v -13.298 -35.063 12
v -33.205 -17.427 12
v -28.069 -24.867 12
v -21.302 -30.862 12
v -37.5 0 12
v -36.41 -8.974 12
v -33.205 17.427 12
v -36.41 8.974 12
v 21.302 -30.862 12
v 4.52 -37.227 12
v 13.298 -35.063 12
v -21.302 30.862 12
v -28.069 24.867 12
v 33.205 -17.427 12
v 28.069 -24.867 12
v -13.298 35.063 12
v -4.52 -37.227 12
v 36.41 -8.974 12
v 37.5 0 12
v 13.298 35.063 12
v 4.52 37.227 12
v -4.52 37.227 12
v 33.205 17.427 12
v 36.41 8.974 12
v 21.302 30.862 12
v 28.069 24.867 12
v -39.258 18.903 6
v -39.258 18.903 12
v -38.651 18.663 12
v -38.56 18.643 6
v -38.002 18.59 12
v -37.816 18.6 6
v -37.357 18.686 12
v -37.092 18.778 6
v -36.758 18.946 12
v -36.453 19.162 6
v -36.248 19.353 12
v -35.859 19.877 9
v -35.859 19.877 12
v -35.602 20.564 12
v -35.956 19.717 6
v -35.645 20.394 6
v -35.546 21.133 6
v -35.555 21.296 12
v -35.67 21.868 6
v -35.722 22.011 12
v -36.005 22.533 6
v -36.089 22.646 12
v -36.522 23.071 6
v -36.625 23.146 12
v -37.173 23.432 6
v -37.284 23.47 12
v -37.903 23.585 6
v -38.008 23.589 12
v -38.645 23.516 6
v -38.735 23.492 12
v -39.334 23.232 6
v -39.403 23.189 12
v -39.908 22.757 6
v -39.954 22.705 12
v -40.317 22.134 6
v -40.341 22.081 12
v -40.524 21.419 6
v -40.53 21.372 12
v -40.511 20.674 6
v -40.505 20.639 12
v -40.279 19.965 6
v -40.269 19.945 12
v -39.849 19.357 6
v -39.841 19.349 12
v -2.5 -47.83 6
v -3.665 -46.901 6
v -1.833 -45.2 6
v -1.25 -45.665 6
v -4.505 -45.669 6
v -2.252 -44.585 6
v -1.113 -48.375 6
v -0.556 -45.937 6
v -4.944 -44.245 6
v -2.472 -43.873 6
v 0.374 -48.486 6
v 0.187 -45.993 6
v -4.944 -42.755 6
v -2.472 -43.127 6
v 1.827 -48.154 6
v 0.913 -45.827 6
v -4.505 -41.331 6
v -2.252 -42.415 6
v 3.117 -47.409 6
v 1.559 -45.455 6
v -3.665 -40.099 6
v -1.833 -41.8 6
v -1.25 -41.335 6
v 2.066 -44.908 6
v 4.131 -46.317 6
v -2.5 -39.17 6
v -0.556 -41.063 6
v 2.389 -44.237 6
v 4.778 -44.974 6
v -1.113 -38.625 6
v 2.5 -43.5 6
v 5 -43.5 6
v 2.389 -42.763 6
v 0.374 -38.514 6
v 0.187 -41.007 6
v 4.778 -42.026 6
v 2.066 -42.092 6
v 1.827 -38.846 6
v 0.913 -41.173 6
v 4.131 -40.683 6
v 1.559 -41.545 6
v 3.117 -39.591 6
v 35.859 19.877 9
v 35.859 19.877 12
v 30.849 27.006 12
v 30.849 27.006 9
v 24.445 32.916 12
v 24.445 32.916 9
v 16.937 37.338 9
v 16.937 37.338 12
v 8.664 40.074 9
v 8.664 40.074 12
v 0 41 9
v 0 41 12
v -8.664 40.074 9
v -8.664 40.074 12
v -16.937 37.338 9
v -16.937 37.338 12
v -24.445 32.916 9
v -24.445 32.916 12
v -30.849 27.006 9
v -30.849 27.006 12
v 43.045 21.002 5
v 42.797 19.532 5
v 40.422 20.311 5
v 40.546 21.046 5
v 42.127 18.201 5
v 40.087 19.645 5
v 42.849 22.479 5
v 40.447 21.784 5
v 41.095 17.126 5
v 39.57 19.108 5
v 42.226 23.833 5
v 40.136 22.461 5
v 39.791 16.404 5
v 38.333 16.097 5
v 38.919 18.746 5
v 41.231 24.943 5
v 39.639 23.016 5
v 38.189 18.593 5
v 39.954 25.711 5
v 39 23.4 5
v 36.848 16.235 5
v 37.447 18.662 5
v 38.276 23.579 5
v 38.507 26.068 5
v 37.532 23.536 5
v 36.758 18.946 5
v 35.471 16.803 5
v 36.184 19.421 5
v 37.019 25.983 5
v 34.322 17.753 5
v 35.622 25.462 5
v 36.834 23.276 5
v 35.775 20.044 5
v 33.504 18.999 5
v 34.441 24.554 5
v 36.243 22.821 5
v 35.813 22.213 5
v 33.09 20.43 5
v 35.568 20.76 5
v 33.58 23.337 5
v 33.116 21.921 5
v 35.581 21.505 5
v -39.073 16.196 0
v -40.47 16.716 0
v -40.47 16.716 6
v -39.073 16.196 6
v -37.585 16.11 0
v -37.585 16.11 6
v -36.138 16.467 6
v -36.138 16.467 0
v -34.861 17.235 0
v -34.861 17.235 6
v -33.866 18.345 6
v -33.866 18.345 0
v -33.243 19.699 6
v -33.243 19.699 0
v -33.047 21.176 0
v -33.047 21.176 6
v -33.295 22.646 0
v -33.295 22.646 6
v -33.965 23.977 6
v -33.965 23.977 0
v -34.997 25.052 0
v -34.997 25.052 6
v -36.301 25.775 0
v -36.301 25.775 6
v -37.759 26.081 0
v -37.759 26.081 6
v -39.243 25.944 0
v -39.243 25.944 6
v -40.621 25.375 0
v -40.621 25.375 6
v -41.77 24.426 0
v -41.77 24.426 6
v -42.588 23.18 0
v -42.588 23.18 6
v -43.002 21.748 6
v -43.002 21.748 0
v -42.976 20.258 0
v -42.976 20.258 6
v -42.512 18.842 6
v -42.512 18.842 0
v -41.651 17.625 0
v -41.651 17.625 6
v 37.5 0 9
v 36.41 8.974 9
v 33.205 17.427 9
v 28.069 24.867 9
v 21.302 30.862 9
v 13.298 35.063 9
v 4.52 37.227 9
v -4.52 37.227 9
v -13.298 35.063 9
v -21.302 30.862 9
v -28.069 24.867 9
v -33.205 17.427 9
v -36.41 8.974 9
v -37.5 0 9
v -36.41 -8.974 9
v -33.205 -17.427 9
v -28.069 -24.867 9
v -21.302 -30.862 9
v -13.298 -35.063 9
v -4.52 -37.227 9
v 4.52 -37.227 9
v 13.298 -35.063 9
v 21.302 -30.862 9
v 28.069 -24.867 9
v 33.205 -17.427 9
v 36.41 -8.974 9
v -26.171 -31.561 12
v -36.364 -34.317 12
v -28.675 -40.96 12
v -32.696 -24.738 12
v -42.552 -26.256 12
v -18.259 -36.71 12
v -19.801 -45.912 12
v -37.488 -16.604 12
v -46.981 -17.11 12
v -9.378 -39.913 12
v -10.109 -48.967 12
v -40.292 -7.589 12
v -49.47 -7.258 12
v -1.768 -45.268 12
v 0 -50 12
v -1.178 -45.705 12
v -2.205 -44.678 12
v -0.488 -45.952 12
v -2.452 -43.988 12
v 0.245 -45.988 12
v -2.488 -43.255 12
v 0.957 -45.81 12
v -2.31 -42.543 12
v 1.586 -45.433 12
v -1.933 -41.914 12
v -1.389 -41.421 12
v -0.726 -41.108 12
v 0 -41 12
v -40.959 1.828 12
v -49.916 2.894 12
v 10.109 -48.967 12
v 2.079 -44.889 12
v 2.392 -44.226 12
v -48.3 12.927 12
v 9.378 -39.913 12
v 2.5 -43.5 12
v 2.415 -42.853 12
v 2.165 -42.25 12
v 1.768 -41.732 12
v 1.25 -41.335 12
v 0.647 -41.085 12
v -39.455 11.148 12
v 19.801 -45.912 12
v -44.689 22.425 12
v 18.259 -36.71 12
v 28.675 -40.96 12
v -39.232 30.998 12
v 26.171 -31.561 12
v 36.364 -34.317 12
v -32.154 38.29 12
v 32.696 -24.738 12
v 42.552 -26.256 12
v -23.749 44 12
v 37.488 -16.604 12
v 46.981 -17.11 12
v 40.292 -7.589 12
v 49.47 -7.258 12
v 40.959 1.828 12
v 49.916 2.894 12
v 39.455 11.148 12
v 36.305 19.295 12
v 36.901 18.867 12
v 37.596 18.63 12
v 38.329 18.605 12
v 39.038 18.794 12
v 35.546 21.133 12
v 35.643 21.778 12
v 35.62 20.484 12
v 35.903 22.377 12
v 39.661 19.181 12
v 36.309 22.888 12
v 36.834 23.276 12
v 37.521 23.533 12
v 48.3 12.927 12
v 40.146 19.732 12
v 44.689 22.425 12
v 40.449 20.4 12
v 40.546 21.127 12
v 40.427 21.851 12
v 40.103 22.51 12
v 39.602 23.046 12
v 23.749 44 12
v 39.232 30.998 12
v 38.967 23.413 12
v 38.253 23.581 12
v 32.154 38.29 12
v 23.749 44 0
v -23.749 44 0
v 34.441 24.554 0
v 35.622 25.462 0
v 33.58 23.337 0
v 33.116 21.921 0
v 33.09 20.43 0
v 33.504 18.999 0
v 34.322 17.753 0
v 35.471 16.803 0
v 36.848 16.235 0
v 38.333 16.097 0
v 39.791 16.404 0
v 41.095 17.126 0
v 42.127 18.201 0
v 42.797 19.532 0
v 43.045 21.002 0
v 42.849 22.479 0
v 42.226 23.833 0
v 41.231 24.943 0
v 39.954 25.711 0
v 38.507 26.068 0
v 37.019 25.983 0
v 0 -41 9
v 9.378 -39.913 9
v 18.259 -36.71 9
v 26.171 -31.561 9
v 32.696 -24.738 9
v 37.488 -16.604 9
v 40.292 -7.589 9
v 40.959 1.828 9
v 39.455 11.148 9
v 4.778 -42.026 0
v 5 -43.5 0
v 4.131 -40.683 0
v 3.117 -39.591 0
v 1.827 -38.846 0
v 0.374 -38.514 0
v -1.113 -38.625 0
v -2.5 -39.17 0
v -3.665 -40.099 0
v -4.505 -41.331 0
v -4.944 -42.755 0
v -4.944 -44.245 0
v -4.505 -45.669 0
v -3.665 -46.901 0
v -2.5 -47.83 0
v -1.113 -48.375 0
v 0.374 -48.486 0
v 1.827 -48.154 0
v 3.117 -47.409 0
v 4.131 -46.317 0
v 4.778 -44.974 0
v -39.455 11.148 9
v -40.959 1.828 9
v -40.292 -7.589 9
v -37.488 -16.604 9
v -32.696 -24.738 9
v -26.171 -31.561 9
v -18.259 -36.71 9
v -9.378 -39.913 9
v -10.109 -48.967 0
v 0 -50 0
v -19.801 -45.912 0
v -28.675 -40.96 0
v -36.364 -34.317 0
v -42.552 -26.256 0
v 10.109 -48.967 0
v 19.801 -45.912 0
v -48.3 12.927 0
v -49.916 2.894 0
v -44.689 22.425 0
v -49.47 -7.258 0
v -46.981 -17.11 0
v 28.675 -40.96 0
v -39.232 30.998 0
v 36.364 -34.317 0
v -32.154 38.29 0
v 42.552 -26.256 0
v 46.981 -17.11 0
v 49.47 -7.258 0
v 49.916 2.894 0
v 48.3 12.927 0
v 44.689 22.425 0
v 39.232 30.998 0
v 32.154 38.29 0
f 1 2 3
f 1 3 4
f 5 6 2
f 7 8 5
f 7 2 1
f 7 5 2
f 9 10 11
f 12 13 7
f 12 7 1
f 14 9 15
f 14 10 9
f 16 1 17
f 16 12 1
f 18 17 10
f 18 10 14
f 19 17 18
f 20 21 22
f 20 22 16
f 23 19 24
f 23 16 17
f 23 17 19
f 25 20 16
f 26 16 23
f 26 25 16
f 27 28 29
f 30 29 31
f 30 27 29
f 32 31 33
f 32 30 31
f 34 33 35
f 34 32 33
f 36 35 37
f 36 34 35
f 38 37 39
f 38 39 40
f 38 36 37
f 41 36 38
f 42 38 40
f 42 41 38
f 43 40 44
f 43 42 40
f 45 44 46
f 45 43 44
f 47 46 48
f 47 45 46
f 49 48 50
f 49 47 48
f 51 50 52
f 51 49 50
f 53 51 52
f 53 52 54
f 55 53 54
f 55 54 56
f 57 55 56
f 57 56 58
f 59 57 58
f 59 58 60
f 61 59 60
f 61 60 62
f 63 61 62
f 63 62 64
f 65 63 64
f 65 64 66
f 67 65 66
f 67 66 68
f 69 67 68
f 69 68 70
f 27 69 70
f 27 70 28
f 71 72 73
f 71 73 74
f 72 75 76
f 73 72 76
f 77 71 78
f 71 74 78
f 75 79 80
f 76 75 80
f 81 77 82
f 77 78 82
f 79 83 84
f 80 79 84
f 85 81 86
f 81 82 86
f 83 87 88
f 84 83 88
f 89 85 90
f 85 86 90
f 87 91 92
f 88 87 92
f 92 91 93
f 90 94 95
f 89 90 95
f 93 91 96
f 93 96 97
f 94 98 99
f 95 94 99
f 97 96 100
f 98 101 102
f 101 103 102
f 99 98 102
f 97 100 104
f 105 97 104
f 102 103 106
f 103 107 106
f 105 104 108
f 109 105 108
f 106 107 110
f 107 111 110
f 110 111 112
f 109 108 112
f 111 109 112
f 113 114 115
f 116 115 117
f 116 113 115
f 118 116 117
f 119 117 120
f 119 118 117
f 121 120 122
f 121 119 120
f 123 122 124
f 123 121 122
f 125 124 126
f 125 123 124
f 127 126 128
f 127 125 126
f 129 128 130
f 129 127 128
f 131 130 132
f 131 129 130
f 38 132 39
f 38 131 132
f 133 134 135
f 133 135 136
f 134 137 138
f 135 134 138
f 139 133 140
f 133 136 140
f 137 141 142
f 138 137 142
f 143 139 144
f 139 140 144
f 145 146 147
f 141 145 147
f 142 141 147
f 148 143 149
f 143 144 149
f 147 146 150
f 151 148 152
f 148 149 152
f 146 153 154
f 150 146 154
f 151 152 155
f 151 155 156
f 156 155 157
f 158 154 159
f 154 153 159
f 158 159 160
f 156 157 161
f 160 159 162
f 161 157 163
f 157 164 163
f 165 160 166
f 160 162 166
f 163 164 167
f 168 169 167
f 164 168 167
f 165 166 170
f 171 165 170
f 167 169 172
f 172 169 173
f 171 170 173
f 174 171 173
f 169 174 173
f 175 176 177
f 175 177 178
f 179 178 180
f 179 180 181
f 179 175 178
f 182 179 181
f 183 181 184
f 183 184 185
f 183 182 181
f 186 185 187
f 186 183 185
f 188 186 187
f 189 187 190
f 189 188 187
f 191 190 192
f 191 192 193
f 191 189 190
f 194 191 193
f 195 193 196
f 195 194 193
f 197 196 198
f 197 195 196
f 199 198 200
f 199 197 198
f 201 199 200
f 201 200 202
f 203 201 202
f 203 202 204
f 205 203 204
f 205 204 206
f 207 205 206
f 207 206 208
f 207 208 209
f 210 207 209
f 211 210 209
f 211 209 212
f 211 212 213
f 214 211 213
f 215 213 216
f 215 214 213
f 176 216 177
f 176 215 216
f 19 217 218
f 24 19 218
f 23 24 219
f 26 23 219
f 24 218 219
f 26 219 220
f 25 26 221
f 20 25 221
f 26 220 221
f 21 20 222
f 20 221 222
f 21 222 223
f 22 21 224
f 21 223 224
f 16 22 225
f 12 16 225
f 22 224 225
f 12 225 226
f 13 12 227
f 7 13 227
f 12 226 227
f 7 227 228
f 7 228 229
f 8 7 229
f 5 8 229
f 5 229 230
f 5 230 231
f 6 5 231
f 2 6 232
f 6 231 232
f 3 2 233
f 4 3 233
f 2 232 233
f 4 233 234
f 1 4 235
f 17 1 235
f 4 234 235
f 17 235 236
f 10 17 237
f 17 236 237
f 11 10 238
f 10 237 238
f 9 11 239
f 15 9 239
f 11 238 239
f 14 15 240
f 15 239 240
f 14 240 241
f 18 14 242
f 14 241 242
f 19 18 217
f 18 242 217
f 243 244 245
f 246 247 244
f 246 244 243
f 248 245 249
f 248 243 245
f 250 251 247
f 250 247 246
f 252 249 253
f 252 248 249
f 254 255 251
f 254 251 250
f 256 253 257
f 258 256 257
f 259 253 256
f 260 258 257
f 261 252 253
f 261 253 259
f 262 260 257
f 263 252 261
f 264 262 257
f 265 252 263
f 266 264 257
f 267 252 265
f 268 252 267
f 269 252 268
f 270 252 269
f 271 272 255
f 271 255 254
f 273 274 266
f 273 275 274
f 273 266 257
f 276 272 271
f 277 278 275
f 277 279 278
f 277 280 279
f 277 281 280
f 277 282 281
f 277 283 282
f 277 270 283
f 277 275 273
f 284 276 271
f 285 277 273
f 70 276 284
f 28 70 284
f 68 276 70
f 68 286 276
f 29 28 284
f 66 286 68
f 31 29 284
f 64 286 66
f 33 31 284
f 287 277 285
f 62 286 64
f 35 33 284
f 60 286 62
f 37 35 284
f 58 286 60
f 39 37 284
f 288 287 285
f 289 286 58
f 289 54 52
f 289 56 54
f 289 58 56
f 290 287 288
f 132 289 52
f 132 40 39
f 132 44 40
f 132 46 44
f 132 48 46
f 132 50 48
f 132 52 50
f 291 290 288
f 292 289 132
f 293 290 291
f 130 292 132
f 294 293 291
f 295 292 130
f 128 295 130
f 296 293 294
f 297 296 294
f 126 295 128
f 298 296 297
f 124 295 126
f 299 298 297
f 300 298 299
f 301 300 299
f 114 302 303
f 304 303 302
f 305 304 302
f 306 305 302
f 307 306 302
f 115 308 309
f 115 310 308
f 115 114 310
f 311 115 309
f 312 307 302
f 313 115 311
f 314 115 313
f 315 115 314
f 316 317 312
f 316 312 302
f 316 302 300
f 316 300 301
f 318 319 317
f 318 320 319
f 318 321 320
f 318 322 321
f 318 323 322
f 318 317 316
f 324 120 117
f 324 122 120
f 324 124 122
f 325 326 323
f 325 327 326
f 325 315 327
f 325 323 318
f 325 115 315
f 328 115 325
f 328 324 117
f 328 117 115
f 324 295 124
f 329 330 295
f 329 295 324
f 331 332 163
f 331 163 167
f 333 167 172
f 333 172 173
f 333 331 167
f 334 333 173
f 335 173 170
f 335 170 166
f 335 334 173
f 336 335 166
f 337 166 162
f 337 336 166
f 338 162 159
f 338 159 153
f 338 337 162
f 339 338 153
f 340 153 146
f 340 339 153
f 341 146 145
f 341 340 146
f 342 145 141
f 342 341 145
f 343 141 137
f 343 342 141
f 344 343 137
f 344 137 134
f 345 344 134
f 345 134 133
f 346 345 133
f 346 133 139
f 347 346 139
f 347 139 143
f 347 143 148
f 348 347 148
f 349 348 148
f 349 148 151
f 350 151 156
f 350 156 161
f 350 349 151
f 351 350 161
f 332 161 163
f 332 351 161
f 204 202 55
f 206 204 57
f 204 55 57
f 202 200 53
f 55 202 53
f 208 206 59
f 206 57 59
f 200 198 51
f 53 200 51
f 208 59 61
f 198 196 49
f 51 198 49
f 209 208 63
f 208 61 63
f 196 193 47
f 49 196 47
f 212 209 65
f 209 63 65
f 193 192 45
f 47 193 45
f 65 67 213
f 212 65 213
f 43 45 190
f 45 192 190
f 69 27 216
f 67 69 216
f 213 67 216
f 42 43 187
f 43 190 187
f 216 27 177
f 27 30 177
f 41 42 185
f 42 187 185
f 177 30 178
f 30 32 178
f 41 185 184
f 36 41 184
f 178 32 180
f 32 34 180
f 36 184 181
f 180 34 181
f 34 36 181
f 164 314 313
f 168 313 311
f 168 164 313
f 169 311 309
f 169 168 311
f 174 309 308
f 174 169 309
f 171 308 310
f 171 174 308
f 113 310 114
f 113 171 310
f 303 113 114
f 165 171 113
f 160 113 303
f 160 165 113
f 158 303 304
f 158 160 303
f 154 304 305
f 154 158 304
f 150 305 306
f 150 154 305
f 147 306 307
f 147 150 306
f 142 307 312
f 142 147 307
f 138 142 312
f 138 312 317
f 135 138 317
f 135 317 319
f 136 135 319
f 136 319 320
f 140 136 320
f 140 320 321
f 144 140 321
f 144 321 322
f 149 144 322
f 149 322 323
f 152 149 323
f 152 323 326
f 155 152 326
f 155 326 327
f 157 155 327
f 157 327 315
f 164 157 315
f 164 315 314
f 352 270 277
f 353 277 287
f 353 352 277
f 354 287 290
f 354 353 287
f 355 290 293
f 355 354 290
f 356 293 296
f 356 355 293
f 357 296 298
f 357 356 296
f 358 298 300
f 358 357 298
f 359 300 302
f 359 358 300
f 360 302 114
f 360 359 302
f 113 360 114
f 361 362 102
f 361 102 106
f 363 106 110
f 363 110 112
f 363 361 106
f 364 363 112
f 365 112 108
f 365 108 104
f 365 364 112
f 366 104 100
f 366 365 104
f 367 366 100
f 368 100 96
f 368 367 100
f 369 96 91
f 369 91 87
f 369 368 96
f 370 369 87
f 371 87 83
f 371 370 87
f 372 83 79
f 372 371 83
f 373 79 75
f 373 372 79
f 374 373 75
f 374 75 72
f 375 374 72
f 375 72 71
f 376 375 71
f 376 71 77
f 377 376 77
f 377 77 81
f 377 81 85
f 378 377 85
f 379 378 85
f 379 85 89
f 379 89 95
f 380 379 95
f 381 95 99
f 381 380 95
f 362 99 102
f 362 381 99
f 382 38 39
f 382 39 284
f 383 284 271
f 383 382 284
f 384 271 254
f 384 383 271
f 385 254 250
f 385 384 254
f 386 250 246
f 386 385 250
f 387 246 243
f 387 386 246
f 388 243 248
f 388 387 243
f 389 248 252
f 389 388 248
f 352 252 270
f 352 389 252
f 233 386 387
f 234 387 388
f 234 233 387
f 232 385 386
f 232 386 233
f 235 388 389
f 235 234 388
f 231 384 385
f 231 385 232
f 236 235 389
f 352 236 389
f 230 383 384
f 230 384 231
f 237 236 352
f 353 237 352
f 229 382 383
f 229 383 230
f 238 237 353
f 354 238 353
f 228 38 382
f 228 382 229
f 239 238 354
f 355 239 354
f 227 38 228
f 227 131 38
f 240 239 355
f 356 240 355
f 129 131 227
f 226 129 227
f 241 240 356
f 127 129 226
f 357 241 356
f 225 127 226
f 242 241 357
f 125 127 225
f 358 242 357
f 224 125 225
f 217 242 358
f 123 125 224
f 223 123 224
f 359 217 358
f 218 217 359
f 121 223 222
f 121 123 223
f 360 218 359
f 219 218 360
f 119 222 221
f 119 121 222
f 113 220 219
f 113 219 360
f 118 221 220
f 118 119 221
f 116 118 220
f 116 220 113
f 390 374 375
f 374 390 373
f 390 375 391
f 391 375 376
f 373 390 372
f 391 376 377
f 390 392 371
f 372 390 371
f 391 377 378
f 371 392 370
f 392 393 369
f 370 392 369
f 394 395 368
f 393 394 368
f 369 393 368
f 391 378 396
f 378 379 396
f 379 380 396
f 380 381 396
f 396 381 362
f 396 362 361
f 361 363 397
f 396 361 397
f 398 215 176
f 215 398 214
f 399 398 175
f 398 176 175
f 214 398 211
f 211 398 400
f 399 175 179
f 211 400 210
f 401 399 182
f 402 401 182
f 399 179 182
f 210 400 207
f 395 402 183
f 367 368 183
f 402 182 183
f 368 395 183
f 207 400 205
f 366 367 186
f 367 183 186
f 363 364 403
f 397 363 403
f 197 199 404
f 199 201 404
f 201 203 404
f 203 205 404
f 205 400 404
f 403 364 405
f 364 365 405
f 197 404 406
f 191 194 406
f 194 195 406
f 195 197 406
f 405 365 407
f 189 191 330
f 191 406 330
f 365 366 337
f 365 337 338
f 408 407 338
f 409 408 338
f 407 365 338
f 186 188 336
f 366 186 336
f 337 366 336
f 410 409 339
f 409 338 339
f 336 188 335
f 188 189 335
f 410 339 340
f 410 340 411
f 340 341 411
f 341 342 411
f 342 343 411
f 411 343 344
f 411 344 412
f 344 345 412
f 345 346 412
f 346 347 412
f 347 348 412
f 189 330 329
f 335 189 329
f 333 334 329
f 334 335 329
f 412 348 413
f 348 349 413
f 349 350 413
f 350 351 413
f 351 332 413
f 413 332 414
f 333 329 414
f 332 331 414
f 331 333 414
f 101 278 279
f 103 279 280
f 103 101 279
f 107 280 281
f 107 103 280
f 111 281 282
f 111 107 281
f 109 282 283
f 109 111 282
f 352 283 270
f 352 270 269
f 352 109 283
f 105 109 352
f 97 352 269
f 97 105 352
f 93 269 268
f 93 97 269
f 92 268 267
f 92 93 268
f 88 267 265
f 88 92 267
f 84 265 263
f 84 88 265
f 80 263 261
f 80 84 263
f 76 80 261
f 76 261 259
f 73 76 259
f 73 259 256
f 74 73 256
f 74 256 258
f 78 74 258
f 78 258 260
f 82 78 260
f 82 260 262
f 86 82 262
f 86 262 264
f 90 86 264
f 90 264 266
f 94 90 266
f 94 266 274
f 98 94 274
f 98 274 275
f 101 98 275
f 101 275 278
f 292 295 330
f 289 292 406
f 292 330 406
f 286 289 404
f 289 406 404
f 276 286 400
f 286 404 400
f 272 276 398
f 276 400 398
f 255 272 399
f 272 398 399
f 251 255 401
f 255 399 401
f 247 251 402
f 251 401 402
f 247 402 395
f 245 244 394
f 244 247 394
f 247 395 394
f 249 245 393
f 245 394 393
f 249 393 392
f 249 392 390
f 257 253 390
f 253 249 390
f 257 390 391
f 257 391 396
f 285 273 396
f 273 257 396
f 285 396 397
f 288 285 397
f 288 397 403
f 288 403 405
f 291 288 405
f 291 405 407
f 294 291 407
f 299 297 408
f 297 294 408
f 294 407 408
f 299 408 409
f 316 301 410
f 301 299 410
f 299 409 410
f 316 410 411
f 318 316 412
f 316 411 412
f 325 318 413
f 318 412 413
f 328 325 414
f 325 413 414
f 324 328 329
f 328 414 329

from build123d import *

# Parameters (mm, degrees)
CYLINDER007_R               = 5
CYLINDER007_DEPTH           = 5
COMPOUND003_PLACEMENT_ANGLE = 119
CYLINDER008_R               = 5
CYLINDER008_DEPTH           = 6
COMPOUND004_PLACEMENT_ANGLE = 119
CYLINDER006_R               = 5
CYLINDER006_DEPTH           = 6
CYLINDER004_R               = 2.5
CYLINDER004_DEPTH           = 12
COMPOUND_PLACEMENT_ANGLE    = 119
CYLINDER005_R               = 2.5
CYLINDER005_DEPTH           = 12
COMPOUND001_PLACEMENT_ANGLE = 241
CYLINDER003_R               = 2.5
CYLINDER003_DEPTH           = 12
BOX_W                       = 200
BOX_H                       = 100
BOX_DEPTH                   = 12
CYLINDER001_R               = 37.5
CYLINDER001_DEPTH           = 3
CYLINDER002_R               = 41
CYLINDER002_DEPTH           = 3
CYLINDER_R                  = 50
CYLINDER_DEPTH              = 12


with BuildPart() as compound003:
    # Cylinder007 → Cylinder007 (new body)
    with BuildSketch(Plane(origin=(0, -43.5, 0), x_dir=(1, 0, 0), z_dir=(0, 0, 1))):
        Circle(CYLINDER007_R)
    extrude(amount=CYLINDER007_DEPTH)


with BuildPart() as compound003_1:
    # Compound003 placement: moved
    add(compound003.part.rotate(Axis((0, 0, 0), (0, 0, 1)), COMPOUND003_PLACEMENT_ANGLE))


with BuildPart() as compound004:
    # Cylinder008 → Cylinder008 (new body)
    with BuildSketch(Plane(origin=(0, -43.5, 0), x_dir=(1, 0, 0), z_dir=(0, 0, 1))):
        Circle(CYLINDER008_R)
    extrude(amount=CYLINDER008_DEPTH)


with BuildPart() as compound004_1:
    # Compound004 placement: moved
    add(compound004.part.rotate(Axis((0, 0, 0), (0, 0, -1)), COMPOUND004_PLACEMENT_ANGLE))


with BuildPart() as compound005:
    # Cylinder006 → Cylinder006 (new body)
    with BuildSketch(Plane(origin=(0, -43.5, 0), x_dir=(1, 0, 0), z_dir=(0, 0, 1))):
        Circle(CYLINDER006_R)
    extrude(amount=CYLINDER006_DEPTH)

    # Compound005: union Compound003, Compound004
    add(compound003_1.part)
    add(compound004_1.part)


with BuildPart() as compound:
    # Cylinder004 → Cylinder004 (new body)
    with BuildSketch(Plane(origin=(0, -43.5, 0), x_dir=(1, 0, 0), z_dir=(0, 0, 1))):
        Circle(CYLINDER004_R)
    extrude(amount=CYLINDER004_DEPTH)


with BuildPart() as compound_1:
    # Compound placement: moved
    add(compound.part.rotate(Axis((0, 0, 0), (0, 0, 1)), COMPOUND_PLACEMENT_ANGLE))


with BuildPart() as compound001:
    # Cylinder005 → Cylinder005 (new body)
    with BuildSketch(Plane(origin=(0, -43.5, 0), x_dir=(1, 0, 0), z_dir=(0, 0, 1))):
        Circle(CYLINDER005_R)
    extrude(amount=CYLINDER005_DEPTH)


with BuildPart() as compound001_1:
    # Compound001 placement: moved
    add(compound001.part.rotate(Axis((0, 0, 0), (0, 0, 1)), COMPOUND001_PLACEMENT_ANGLE))


with BuildPart() as compound002:
    # Cylinder003 → Cylinder003 (new body)
    with BuildSketch(Plane(origin=(0, -43.5, 0), x_dir=(1, 0, 0), z_dir=(0, 0, 1))):
        Circle(CYLINDER003_R)
    extrude(amount=CYLINDER003_DEPTH)

    # Compound002: union Compound, Compound001
    add(compound_1.part)
    add(compound001_1.part)


with BuildPart() as cube:
    # Box → Box (new body)
    with BuildSketch(Plane(origin=(-100, 44, 0), x_dir=(1, 0, 0), z_dir=(0, 0, 1))):
        with Locations((100, 50)):
            Rectangle(BOX_W, BOX_H)
    extrude(amount=BOX_DEPTH)


with BuildPart() as cylinder001:
    # Cylinder001 → Cylinder001 (new body)
    with BuildSketch(Plane.XY):
        Circle(CYLINDER001_R)
    extrude(amount=CYLINDER001_DEPTH)


with BuildPart() as cut:
    # Cylinder002 → Cylinder002 (new body)
    with BuildSketch(Plane.XY):
        Circle(CYLINDER002_R)
    extrude(amount=CYLINDER002_DEPTH)

    # Cut: cut Cylinder001
    add(cylinder001.part, mode=Mode.SUBTRACT)


with BuildPart() as cut_1:
    # Cut placement: moved
    add(cut.part.moved(Location((0, 0, 9))))


with BuildPart() as xl30topbackflange100:
    # Cylinder → Cylinder (new body)
    with BuildSketch(Plane.XY):
        Circle(CYLINDER_R)
    extrude(amount=CYLINDER_DEPTH)

    # Cut001: cut Cut
    add(cut_1.part, mode=Mode.SUBTRACT)

    # Cut002: cut Cube
    add(cube.part, mode=Mode.SUBTRACT)

    # Cut003: cut Compound002
    add(compound002.part, mode=Mode.SUBTRACT)

    # Cut004: cut Compound005
    add(compound005.part, mode=Mode.SUBTRACT)


solid = xl30topbackflange100.part
